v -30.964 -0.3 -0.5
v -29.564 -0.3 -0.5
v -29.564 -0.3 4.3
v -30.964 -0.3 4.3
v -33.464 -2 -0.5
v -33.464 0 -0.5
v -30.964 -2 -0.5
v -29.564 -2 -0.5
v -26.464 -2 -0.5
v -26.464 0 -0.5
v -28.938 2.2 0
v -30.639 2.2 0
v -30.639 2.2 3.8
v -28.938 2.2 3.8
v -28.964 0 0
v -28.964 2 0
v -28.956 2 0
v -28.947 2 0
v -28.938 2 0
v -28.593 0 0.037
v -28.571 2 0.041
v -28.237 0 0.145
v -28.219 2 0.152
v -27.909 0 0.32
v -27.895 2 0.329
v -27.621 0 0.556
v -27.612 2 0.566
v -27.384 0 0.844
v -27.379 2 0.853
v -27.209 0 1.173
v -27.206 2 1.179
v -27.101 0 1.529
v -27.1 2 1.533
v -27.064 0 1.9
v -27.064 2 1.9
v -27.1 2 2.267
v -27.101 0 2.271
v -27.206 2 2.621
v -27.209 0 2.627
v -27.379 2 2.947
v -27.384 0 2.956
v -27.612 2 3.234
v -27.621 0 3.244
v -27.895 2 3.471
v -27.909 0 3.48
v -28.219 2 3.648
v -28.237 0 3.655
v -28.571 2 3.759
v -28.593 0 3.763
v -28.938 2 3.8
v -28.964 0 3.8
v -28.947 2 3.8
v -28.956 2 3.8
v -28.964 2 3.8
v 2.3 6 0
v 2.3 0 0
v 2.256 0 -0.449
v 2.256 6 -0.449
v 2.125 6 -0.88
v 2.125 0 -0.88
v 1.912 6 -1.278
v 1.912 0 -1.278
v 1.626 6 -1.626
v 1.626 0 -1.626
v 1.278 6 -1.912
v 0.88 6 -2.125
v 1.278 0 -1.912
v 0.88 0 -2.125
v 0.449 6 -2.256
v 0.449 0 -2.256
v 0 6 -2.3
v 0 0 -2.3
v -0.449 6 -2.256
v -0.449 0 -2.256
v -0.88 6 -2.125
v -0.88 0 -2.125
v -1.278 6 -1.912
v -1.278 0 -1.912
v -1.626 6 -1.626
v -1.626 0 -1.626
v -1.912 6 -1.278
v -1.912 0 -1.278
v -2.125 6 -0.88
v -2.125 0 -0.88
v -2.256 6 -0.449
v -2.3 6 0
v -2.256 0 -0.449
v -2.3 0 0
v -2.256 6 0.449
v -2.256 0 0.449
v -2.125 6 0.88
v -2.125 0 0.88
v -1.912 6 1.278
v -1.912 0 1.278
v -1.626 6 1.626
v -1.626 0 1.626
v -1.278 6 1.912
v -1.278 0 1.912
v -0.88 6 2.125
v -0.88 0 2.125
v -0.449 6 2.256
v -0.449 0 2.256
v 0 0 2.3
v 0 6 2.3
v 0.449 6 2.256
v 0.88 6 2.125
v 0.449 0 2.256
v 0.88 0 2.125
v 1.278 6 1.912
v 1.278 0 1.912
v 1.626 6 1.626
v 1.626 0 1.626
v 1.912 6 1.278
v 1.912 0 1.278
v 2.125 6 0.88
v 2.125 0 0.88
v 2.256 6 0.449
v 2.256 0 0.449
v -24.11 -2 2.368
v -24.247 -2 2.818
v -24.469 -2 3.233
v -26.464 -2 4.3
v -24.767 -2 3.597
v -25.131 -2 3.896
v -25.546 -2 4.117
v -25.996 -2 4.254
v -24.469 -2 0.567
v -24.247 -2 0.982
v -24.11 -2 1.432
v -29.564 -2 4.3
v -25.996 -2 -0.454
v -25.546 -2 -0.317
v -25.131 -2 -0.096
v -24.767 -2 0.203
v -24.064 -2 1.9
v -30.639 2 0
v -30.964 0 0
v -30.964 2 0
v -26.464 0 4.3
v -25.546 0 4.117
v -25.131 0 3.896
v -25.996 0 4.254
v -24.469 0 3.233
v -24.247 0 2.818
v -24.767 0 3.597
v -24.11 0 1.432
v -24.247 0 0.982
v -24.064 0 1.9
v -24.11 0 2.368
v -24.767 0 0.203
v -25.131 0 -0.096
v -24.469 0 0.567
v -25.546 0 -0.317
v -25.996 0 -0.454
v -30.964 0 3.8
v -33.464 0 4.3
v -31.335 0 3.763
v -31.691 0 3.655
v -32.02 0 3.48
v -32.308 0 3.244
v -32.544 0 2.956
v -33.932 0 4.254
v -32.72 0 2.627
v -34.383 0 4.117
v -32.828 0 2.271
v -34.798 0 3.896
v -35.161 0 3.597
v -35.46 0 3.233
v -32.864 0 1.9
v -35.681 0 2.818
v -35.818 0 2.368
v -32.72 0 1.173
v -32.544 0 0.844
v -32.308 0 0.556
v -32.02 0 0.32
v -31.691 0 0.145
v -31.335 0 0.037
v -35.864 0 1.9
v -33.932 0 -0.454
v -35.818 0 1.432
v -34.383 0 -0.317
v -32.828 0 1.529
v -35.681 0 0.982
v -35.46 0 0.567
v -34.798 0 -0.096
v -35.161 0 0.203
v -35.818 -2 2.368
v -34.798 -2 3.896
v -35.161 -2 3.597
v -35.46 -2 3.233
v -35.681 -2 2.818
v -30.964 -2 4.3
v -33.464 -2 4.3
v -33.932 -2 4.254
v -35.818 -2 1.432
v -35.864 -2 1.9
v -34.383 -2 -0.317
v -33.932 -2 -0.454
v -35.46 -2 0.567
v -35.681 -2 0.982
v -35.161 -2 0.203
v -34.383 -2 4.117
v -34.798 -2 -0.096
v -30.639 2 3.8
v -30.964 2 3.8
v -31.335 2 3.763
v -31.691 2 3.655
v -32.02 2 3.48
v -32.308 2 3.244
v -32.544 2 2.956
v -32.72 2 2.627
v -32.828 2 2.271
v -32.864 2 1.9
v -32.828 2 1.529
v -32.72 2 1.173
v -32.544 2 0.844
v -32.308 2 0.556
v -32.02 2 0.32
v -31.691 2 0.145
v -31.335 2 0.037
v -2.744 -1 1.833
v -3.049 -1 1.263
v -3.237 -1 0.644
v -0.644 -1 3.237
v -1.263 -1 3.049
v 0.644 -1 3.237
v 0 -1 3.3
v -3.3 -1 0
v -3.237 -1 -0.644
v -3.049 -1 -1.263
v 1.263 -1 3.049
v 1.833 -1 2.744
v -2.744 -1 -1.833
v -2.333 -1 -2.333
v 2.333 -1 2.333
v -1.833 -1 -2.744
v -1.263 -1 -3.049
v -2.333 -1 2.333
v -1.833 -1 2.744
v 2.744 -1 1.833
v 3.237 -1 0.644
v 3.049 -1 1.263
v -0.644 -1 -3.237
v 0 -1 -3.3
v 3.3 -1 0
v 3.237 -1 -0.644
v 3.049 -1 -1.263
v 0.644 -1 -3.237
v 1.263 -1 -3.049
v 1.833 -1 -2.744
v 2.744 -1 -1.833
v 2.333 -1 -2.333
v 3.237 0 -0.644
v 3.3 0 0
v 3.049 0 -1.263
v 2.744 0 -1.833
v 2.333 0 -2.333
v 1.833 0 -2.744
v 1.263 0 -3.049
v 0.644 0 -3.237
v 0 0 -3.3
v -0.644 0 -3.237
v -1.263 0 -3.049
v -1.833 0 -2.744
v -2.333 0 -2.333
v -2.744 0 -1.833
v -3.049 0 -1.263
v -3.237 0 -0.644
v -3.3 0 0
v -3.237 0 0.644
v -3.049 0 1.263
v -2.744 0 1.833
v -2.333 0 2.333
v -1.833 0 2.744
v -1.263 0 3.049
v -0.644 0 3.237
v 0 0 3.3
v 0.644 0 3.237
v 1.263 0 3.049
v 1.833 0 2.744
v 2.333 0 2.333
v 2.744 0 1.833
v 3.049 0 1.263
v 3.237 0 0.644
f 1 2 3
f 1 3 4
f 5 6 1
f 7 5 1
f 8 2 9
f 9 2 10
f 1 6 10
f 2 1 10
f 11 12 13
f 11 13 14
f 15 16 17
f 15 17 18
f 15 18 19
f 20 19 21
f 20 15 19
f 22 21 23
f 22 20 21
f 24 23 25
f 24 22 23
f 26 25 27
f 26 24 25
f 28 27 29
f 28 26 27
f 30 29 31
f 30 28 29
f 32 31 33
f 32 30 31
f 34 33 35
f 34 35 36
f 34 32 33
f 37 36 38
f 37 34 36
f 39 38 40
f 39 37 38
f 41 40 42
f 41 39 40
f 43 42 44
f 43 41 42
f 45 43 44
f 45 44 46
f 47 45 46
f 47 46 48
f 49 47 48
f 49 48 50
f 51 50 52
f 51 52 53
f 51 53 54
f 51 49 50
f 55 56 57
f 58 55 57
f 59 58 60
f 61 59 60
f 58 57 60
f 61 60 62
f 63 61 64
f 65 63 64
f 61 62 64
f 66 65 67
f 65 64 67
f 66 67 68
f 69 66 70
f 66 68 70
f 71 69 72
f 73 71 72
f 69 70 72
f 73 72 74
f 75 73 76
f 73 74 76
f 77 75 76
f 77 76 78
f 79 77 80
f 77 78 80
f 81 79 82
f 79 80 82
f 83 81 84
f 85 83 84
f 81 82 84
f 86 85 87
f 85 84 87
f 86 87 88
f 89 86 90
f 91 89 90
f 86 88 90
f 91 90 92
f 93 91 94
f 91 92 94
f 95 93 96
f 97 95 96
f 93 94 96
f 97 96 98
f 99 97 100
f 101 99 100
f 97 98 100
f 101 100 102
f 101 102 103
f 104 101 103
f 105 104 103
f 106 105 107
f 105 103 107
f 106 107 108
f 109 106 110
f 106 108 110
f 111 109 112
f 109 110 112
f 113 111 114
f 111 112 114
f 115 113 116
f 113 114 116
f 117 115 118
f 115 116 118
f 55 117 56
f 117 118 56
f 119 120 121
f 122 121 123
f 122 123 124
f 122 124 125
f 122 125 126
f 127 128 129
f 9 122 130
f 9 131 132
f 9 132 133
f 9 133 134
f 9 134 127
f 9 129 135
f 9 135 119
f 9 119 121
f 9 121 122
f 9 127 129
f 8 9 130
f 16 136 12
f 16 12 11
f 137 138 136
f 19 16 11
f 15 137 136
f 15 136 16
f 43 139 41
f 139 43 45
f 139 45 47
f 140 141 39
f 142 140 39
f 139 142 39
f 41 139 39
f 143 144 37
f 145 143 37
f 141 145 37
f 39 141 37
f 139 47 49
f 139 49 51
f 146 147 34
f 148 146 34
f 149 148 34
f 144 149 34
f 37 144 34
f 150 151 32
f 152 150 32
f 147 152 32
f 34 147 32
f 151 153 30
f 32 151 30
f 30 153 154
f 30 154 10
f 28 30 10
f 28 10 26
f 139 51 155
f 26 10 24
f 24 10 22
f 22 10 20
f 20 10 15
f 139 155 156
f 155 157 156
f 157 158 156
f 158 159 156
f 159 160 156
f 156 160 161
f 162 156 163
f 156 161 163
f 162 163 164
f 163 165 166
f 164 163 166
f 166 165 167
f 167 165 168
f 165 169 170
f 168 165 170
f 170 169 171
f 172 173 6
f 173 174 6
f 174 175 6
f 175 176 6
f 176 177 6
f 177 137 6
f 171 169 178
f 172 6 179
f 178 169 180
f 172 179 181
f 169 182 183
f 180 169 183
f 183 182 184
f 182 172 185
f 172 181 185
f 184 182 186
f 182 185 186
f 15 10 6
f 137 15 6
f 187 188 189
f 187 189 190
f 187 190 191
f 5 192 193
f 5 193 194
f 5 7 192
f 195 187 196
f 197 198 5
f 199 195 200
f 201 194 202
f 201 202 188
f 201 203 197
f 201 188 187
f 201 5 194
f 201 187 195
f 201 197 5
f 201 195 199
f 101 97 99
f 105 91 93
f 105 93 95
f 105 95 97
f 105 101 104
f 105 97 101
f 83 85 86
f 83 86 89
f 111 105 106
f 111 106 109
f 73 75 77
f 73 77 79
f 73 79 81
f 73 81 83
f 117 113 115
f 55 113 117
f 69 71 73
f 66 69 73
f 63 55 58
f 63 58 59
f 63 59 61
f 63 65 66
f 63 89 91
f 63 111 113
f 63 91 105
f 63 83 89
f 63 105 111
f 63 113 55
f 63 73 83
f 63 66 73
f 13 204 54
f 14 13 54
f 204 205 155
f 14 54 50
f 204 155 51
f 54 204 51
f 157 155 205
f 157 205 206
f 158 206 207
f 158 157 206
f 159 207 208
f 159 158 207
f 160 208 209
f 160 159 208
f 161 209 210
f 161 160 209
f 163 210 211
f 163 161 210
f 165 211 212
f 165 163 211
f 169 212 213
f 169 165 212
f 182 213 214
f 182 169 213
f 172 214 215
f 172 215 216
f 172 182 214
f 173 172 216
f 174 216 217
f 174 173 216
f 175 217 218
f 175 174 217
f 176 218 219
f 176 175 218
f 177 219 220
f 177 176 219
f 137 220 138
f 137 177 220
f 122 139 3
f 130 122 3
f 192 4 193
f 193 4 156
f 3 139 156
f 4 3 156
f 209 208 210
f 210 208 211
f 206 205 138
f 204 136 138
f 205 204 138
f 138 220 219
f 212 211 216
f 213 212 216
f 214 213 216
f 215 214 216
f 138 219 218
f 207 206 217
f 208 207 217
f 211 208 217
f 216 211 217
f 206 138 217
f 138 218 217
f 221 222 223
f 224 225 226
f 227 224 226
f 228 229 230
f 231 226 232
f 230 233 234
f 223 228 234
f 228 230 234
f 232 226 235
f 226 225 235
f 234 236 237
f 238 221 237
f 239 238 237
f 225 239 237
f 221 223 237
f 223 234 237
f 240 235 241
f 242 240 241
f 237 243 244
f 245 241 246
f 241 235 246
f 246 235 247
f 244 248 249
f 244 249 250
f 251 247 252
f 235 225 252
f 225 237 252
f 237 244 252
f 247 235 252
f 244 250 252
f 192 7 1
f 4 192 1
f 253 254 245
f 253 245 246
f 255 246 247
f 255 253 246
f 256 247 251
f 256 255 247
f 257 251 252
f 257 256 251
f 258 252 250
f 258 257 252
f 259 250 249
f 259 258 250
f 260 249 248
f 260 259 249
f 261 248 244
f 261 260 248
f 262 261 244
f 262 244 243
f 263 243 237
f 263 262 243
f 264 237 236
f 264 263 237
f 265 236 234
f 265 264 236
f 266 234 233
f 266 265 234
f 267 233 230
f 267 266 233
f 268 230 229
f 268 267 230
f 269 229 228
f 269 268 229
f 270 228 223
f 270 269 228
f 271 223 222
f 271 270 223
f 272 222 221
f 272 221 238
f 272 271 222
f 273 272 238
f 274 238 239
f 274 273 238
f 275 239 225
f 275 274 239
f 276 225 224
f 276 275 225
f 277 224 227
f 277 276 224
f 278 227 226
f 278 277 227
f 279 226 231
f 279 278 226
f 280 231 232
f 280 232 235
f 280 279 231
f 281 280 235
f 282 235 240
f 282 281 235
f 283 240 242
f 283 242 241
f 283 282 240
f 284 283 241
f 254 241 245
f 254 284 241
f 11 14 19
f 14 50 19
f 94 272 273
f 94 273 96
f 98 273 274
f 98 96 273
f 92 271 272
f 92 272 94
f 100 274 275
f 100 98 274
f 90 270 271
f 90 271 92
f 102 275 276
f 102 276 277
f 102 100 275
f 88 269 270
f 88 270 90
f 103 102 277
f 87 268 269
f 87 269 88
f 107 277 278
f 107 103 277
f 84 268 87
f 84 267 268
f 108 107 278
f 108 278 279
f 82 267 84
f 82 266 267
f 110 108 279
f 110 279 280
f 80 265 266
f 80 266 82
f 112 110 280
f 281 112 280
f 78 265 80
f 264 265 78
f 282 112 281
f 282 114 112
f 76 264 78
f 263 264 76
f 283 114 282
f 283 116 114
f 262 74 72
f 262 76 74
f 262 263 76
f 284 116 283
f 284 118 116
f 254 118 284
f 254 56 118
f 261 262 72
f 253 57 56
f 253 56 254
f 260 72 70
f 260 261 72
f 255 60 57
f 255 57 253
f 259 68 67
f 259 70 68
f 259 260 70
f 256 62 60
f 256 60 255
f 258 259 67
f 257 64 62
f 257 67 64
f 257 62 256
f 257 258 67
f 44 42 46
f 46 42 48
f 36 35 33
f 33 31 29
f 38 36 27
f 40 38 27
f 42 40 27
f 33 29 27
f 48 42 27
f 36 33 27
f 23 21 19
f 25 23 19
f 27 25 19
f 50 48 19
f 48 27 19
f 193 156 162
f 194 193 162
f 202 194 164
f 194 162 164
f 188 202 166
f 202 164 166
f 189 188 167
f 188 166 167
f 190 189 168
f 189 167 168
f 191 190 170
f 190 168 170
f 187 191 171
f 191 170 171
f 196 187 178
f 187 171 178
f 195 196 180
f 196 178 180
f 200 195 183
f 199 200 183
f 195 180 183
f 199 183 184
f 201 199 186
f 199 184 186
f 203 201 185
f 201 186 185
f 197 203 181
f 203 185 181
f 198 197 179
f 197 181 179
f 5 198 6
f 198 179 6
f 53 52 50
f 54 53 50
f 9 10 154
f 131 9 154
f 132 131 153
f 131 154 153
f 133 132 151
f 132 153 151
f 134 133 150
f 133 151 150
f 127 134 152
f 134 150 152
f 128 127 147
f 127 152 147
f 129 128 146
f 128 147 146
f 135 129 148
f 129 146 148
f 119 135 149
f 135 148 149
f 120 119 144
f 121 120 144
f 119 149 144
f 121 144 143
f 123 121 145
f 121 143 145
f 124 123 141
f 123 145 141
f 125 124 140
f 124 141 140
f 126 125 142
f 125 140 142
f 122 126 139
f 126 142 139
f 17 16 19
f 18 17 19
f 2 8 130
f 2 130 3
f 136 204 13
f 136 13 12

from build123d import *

# Parameters (mm, degrees)
SKETCH_1_R          = 3.3
EXTRUDE_1_DEPTH     = 1
SKETCH_1_3_R        = 2.3
EXTRUDE_2_DEPTH     = 6
EXTRUDE_3_DEPTH     = 2
EXTRUDE_4_DEPTH     = 2
SKETCH_2_W          = 1.4
SKETCH_2_H          = 1.7
CUT_EXTRUDE_1_DEPTH = 37.678033239
SKETCH_3_W          = 1.700465275
SKETCH_3_H          = 3.8
EXTRUDE_5_DEPTH     = 0.2


with BuildPart() as part:
    # 草图1 → 凸台-拉伸1 (new body)
    with BuildSketch(Plane(origin=(0, 0, 0), x_dir=(1, 0, 0), z_dir=(0, 1, 0))):
        Circle(SKETCH_1_R)
    extrude(amount=-EXTRUDE_1_DEPTH)

    # 草图1<3> → 凸台-拉伸2 (add)
    with BuildSketch(Plane(origin=(0, 0, 0), x_dir=(1, 0, 0), z_dir=(0, 1, 0))):
        Circle(SKETCH_1_3_R)
    extrude(amount=EXTRUDE_2_DEPTH)


with BuildPart() as body_2:
    # 草图1<5> → 凸台-拉伸3 (new body)
    with BuildSketch(Plane(origin=(0, 0, 0), x_dir=(1, 0, 0), z_dir=(0, 1, 0))):
        with BuildLine():
            Line((-26.464162089, 0.5), (-33.464162089, 0.5))
            ThreePointArc((-33.464162089, 0.5), (-35.864162089, -1.9), (-33.464162089, -4.3))
            Line((-33.464162089, -4.3), (-26.464162089, -4.3))
            ThreePointArc((-26.464162089, -4.3), (-24.064162089, -1.9), (-26.464162089, 0.5))
        make_face()
    extrude(amount=-EXTRUDE_3_DEPTH)

    # 草图1<6> → 凸台-拉伸4 (add)
    with BuildSketch(Plane(origin=(0, 0, 0), x_dir=(1, 0, 0), z_dir=(0, 1, 0))):
        with BuildLine():
            Line((-28.964162089, 0), (-30.964162089, 0))
            ThreePointArc((-30.964162089, 0), (-32.864162089, -1.9), (-30.964162089, -3.8))
            Line((-30.964162089, -3.8), (-28.964162089, -3.8))
            ThreePointArc((-28.964162089, -3.8), (-27.064162089, -1.9), (-28.964162089, 0))
        make_face()
    extrude(amount=EXTRUDE_4_DEPTH)

    # 草图2 → 切除-拉伸1 (cut, through all)
    with BuildSketch(Plane(origin=(0, 0, -0.5), x_dir=(-1, 0, 0), z_dir=(0, 0, -1))):
        with Locations((30.264162089, -1.15)):
            Rectangle(SKETCH_2_W, SKETCH_2_H)
    extrude(amount=-CUT_EXTRUDE_1_DEPTH, mode=Mode.SUBTRACT)

    # 草图3 → 凸台-拉伸5 (add)
    with BuildSketch(Plane(origin=(0, 2, 0), x_dir=(1, 0, 0), z_dir=(0, 1, 0))):
        with Locations((-29.788449326, -1.9)):
            Rectangle(SKETCH_3_W, SKETCH_3_H)
    extrude(amount=EXTRUDE_5_DEPTH)


solid = Compound([part.part, body_2.part])
